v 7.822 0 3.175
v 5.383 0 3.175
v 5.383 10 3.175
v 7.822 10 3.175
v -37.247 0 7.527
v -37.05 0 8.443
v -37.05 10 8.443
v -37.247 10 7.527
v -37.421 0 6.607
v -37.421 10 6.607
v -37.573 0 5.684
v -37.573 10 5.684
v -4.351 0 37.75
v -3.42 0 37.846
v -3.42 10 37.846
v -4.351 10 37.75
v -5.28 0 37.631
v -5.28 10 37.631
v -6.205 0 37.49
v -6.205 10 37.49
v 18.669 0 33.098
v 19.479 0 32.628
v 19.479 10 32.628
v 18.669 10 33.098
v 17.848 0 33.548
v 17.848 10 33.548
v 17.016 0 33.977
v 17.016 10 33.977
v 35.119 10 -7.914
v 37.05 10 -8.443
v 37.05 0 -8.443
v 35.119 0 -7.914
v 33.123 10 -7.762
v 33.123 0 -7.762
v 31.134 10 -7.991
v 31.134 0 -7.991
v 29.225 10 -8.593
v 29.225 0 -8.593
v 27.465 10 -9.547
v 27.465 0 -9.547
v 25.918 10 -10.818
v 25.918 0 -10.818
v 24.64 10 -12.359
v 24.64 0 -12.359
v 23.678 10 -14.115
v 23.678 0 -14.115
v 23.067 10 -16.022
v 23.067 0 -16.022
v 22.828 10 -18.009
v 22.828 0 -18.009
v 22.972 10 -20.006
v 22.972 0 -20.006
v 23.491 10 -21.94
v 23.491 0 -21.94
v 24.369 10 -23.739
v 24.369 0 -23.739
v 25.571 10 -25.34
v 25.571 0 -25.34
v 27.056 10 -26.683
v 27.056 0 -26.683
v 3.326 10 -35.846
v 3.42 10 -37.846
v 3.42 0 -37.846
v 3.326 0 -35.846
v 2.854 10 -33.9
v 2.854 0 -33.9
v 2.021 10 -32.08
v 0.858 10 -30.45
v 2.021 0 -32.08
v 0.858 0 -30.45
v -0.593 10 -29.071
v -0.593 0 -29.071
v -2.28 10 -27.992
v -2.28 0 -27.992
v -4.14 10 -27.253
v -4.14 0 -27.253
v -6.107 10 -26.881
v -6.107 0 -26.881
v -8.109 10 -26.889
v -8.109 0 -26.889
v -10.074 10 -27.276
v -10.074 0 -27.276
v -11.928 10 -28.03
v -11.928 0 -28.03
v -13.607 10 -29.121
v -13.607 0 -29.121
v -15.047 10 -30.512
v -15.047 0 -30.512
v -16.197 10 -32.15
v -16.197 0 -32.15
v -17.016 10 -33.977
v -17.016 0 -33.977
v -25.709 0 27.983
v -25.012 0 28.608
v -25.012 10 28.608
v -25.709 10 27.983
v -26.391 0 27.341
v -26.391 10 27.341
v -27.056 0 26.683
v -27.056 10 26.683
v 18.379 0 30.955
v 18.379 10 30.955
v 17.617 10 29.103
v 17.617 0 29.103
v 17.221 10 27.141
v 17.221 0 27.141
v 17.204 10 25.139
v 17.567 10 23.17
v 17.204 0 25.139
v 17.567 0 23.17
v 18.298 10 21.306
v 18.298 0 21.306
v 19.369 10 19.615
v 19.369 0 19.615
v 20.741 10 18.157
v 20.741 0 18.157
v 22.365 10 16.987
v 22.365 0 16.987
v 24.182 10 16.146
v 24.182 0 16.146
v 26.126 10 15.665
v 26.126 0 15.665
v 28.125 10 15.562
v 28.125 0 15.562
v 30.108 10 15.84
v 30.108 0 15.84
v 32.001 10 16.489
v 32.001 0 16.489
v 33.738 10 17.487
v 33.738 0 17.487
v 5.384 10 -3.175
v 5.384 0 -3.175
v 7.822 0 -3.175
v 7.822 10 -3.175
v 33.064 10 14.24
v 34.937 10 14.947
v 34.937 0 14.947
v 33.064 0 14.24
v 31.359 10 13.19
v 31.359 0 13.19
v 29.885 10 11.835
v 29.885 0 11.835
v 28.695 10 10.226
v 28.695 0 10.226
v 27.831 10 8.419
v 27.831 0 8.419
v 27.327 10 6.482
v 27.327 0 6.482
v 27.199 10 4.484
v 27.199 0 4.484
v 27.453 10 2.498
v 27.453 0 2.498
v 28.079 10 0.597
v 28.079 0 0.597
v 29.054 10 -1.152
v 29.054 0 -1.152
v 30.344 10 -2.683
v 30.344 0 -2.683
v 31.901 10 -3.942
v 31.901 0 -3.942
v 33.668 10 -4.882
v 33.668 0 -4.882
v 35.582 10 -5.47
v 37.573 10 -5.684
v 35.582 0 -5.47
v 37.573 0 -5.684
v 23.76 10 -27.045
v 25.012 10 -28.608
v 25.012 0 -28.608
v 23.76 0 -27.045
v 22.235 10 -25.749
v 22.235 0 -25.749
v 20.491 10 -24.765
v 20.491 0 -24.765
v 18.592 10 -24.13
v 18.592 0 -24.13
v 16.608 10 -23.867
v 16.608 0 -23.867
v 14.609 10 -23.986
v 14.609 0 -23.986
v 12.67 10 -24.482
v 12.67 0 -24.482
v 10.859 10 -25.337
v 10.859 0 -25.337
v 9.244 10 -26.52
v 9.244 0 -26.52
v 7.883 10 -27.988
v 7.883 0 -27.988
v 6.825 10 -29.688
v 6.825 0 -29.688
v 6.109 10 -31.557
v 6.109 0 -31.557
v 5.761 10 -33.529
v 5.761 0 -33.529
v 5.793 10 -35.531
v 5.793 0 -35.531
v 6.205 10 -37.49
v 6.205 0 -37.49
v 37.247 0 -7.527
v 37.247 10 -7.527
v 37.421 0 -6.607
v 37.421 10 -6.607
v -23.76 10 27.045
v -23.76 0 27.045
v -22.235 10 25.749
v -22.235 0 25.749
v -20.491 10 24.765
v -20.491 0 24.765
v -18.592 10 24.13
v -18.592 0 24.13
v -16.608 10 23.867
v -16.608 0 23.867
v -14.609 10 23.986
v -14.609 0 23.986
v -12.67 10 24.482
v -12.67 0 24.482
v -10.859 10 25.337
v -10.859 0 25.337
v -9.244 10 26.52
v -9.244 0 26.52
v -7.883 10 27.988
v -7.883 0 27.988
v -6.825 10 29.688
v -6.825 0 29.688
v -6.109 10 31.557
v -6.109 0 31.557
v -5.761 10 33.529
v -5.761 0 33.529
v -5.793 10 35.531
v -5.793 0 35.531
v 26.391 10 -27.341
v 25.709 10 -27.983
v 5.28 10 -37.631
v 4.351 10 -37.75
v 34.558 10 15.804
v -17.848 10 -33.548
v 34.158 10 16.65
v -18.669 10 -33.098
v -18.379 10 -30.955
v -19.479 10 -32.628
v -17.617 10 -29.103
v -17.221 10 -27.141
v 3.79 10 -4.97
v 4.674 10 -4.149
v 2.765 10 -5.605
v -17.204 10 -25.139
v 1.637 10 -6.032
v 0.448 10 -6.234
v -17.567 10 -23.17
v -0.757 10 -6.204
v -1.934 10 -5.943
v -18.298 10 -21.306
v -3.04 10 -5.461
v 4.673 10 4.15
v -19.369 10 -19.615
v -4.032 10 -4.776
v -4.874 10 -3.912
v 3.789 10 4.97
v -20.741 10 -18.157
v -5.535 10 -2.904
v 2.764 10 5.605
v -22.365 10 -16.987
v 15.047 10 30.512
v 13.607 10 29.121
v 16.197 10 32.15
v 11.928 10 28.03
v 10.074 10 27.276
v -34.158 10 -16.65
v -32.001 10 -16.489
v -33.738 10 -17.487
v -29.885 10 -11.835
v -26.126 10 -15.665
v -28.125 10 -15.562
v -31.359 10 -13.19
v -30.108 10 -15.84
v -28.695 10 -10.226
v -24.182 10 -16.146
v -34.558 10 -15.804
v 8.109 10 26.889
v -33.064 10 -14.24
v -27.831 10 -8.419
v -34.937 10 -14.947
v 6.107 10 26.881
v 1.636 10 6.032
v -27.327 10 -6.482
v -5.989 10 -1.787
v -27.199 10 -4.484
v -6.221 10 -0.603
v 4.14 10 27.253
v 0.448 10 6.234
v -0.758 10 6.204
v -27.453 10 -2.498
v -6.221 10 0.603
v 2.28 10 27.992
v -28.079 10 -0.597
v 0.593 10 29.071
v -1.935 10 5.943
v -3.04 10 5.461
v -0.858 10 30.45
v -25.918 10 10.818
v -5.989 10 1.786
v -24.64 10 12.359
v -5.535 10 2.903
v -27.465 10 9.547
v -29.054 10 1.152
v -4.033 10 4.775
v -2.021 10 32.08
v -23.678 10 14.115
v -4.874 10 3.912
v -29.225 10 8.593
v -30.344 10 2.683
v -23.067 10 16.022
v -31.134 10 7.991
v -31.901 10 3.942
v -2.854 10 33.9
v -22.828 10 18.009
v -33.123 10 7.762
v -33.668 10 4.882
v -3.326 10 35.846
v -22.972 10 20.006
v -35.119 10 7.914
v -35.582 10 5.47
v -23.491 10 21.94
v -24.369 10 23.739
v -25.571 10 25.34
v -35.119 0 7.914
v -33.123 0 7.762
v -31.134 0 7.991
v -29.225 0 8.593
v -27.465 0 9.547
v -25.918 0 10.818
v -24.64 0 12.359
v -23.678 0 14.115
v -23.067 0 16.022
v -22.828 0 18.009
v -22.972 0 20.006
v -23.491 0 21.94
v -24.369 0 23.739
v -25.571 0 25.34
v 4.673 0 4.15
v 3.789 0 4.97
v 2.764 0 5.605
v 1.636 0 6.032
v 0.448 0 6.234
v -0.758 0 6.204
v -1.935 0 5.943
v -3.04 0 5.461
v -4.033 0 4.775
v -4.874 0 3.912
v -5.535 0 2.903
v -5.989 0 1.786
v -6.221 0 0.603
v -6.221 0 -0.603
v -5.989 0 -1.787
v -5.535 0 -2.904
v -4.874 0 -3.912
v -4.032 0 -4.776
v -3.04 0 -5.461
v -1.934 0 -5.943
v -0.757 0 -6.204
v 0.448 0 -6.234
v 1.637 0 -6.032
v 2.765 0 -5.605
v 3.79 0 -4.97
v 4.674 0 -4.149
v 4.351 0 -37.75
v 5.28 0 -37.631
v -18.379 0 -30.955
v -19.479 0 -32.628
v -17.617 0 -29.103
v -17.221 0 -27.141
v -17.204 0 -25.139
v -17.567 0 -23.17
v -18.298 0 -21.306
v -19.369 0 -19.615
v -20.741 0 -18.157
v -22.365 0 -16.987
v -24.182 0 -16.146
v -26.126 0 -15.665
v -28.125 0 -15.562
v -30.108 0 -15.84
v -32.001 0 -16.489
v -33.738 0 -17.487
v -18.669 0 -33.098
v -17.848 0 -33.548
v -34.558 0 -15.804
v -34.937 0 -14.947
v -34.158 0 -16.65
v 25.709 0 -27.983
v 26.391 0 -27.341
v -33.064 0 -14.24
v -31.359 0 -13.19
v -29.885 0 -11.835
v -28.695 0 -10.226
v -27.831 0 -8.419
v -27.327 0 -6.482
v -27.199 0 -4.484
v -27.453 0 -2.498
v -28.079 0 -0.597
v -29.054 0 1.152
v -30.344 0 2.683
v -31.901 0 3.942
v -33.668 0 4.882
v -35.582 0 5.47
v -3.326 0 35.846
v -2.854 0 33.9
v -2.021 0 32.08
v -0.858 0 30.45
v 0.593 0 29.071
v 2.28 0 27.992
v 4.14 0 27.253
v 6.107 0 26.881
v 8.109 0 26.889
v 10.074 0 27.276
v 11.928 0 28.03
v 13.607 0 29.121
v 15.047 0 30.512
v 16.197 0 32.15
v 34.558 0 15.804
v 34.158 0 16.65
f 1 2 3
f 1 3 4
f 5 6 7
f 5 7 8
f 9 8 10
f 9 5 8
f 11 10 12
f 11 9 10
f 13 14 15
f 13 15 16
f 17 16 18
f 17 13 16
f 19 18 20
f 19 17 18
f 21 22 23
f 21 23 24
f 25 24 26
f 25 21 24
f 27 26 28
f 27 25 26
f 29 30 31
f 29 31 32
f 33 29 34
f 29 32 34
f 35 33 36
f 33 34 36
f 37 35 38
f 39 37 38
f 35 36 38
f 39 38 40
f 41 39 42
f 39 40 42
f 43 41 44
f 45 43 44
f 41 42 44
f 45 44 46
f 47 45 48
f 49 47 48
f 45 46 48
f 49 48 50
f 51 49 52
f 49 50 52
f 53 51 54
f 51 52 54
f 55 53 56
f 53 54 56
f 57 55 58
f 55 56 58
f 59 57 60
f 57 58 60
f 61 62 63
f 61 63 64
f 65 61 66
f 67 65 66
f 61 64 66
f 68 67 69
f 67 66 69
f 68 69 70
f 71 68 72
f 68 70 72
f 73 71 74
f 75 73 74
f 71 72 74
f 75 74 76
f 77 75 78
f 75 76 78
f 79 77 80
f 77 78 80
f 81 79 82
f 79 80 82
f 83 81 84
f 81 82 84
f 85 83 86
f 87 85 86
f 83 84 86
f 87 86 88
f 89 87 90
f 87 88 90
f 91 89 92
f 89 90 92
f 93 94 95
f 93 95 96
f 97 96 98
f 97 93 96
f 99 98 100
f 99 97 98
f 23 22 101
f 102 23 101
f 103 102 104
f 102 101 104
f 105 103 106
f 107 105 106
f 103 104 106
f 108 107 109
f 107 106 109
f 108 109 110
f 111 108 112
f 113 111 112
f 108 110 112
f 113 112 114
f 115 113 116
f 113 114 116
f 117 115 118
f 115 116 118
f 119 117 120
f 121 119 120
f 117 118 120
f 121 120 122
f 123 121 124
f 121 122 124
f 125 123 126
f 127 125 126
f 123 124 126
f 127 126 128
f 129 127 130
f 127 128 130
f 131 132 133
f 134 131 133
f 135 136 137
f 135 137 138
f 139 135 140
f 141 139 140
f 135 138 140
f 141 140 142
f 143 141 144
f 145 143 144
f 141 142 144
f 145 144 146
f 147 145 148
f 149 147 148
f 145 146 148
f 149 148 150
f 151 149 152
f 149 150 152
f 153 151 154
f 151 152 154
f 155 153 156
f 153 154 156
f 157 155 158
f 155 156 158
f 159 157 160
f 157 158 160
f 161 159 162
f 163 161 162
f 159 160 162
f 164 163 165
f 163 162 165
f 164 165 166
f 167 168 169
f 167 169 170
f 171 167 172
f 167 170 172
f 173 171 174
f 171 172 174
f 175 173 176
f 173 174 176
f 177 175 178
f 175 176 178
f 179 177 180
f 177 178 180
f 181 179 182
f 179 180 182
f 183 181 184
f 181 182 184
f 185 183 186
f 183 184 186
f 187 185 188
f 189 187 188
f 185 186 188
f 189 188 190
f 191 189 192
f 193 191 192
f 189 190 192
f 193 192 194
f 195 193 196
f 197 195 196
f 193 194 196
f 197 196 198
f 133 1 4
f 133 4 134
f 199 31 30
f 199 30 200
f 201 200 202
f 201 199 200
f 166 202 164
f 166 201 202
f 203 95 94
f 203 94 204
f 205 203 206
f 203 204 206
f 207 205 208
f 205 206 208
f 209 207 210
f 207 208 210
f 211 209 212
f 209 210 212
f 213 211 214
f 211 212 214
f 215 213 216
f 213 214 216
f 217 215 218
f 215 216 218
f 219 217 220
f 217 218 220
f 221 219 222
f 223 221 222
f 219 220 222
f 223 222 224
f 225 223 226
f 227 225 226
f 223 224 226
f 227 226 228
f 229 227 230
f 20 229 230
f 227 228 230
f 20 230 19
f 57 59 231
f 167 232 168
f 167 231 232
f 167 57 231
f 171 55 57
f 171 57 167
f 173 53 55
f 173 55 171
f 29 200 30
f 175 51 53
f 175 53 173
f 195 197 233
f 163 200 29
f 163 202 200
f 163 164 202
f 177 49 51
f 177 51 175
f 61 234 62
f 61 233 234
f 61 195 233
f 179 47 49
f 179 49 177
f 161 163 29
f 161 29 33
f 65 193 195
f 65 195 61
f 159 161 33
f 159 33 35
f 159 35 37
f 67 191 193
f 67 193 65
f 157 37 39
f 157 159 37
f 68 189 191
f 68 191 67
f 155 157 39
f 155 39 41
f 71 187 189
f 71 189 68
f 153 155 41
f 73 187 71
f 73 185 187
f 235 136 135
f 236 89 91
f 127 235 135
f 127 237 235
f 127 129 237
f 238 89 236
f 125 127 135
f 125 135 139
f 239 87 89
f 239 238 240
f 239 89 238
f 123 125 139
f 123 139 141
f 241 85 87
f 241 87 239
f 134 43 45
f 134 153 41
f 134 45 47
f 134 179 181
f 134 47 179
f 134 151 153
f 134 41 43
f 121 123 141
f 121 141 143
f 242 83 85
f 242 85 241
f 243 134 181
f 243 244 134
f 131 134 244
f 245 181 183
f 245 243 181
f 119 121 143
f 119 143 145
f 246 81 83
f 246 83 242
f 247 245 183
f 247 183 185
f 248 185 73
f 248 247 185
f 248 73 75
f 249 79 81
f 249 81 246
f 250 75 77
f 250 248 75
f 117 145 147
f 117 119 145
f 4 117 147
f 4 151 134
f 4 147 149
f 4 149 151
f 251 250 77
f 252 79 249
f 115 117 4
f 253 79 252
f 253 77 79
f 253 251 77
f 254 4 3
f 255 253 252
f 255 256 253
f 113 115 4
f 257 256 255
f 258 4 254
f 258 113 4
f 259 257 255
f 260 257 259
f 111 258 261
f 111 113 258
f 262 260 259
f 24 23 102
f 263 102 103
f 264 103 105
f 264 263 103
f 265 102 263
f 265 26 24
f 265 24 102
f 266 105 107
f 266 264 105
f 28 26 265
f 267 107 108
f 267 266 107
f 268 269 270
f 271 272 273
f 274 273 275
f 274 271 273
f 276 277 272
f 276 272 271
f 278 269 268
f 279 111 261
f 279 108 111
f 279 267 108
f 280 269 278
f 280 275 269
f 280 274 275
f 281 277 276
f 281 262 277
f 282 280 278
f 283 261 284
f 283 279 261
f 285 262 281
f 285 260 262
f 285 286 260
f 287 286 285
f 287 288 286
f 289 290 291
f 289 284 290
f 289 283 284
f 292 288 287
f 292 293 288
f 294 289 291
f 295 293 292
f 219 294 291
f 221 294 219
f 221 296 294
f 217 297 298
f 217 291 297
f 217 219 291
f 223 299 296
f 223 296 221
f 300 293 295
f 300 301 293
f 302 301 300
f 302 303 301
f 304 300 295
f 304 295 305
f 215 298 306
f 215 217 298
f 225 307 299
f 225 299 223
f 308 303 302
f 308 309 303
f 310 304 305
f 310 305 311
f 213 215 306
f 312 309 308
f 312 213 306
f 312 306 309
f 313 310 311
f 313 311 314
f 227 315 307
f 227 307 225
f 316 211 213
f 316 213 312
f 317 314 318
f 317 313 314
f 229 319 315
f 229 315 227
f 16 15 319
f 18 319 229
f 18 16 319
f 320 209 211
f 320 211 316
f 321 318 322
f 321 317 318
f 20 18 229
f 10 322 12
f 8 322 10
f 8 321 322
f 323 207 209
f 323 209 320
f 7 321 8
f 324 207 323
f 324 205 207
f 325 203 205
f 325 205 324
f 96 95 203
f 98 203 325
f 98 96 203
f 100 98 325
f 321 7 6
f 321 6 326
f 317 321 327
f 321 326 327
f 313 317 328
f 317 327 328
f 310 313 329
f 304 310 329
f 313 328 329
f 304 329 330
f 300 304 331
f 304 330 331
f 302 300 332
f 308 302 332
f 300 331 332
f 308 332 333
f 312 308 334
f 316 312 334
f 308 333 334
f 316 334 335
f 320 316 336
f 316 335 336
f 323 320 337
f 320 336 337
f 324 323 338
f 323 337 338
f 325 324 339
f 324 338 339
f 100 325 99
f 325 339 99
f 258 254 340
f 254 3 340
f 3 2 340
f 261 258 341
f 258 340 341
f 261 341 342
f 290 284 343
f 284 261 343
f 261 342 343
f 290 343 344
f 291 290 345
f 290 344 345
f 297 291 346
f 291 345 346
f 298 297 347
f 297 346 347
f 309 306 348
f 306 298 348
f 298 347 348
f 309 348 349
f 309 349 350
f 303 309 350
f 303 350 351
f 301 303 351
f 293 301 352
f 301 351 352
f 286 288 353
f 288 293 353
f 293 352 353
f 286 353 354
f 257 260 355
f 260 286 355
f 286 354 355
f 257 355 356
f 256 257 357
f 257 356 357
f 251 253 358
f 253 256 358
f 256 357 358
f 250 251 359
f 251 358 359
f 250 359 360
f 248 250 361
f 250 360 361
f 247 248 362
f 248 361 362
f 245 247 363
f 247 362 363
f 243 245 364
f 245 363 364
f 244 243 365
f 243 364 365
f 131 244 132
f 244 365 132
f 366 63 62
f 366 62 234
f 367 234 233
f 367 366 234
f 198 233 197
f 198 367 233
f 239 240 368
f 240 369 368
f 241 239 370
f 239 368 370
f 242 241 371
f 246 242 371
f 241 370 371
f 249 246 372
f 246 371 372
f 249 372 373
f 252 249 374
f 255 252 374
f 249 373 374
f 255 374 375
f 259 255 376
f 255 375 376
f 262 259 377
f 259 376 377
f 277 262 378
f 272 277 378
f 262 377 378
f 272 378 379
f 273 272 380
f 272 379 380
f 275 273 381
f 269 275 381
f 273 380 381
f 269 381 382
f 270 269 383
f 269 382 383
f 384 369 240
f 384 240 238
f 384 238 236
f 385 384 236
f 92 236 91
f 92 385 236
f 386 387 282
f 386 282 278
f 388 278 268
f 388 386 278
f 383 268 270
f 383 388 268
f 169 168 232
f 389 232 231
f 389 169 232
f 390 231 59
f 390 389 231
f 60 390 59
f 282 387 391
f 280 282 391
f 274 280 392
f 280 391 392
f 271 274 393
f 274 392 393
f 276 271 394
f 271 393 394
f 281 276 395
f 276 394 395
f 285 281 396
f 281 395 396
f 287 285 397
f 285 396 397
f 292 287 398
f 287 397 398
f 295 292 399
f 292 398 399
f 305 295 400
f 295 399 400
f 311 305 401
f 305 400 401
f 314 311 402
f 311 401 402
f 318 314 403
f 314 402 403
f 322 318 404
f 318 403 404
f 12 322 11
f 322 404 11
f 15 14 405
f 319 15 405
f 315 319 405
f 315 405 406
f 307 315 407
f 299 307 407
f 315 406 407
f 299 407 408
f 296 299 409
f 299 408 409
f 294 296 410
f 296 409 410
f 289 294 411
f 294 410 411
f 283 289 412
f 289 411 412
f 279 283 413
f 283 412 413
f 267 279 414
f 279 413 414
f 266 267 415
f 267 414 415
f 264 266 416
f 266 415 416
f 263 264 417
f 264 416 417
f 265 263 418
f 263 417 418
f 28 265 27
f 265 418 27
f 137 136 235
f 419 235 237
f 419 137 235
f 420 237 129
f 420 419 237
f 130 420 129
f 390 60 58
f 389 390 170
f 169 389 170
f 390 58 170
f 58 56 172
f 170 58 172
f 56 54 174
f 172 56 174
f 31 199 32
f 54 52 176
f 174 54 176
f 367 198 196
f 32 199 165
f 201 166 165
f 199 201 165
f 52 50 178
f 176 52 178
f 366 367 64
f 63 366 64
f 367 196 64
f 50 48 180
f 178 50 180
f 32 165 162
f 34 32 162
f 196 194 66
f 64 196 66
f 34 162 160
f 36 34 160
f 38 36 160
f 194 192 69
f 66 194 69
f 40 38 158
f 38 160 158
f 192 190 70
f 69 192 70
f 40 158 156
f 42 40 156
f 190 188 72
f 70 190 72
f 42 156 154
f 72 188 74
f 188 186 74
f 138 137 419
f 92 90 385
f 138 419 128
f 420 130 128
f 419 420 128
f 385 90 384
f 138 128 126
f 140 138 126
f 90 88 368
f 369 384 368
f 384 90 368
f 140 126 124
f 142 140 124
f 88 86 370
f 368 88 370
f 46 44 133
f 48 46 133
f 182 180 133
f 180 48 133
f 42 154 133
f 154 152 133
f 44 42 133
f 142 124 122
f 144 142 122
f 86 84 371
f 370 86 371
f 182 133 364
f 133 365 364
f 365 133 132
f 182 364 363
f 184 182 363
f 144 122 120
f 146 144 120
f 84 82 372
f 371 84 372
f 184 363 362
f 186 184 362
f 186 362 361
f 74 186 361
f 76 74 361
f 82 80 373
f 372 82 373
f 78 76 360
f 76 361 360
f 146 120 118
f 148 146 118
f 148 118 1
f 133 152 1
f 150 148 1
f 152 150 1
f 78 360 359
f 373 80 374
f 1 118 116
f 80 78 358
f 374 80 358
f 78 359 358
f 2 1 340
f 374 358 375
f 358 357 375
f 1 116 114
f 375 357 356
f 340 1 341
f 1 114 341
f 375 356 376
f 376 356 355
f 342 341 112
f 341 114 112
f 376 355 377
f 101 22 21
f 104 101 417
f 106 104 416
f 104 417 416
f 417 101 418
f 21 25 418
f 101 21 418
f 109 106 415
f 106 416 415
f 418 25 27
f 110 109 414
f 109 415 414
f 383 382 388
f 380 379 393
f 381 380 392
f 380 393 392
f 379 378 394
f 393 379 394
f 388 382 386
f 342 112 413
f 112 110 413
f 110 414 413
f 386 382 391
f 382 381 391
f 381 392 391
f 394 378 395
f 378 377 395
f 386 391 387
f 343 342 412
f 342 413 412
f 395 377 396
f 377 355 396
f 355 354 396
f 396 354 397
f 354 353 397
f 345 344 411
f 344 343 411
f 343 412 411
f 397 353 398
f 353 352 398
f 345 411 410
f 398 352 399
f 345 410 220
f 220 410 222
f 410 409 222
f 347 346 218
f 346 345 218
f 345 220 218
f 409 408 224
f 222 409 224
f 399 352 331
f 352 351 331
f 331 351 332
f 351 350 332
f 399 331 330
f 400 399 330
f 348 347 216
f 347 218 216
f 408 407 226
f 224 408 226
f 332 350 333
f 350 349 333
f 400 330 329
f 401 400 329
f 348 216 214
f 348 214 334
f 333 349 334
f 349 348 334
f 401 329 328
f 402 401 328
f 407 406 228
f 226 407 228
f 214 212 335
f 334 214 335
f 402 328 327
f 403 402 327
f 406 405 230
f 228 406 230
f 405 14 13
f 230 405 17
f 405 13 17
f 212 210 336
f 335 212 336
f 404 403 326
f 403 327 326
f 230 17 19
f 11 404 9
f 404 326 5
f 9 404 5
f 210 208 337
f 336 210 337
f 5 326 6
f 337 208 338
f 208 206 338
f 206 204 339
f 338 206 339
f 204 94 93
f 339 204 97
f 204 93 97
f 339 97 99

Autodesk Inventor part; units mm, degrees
ref_plane "YZ Plane" through (0, 0, 0) normal (1, 0, 0) x (0, 1, 0)
ref_plane "XZ Plane" through (0, 0, 0) normal (0, 1, 0) x (-1, 0, 0)
ref_plane "XY Plane" through (0, 0, 0) normal (0, 0, 1) x (1, 0, 0)
sketch "Sketch1" plane through (0, 0, 0) normal (0, 1, 0) x (-1, 0, 0)
  arc A0 (-5.3837, -3.1747) -> (-5.3833, 3.1753) centre (0, 0) ccw
  line L0 (-5.3833, 3.1753) -> (-7.8217, 3.1753)
  line L1 (-5.3837, -3.1747) -> (-7.8217, -3.1747)
  line L2 (-7.8217, 3.1753) -> (-7.8217, -3.1747)
  circle A1 centre (0, 0) radius 27.5 construction
  circle A2 centre (0, 0) radius 38
  arc A3 (37.5726, 5.6835) -> (34.9367, -14.9474) centre (37.6936, -4.8158) ccw
  arc A4 (27.0562, 26.6827) -> (37.0503, 8.4426) centre (33.3254, 18.2597) ccw
  arc A5 (6.2052, 37.4899) -> (25.0119, 28.6078) centre (16.228, 34.3606) ccw
  arc A6 (-17.0159, 33.9773) -> (3.4198, 37.8458) centre (-7.0679, 37.3369) ccw
  arc A7 (-33.7375, 17.4865) -> (-19.4786, 32.628) centre (-27.6641, 26.0518) ccw
  arc A8 (-37.5726, -5.6835) -> (-34.9367, 14.9474) centre (-37.6936, 4.8158) ccw
  arc A9 (-27.0562, -26.6827) -> (-37.0503, -8.4426) centre (-33.3254, -18.2597) ccw
  arc A10 (-6.2052, -37.4899) -> (-25.0119, -28.6078) centre (-16.228, -34.3606) ccw
  arc A11 (17.0159, -33.9773) -> (-3.4198, -37.8458) centre (7.0679, -37.3369) ccw
  arc A12 (33.7375, -17.4865) -> (19.4786, -32.628) centre (27.6641, -26.0518) ccw
  dimension "d0" = 12.5
  dimension "d1" = 6.35
  dimension "d2" = 2.4384
  dimension "d3" = 2.438
  dimension "d4" = 55
  dimension "d5" = 76
  dimension "d6" = 10.5
  dimension "d9" = 360
extrude "Extrusion1" add sketch "Sketch1" along normal blind 10 contours A3 A2 A12 A11 A10 A9 A8 A7 A6 A5 A4 | A4 A2 | A2 A12 | A5 A2 | A2 A11 | A6 A2 | A2 A10 | A7 A2 | A2 A9 | A8 A2
sketch "Sketch2" plane through (0, 10, 0) normal (0, 1, 0) x (1, 0, 0)
  arc A0 (-37.5726, -5.6835) -> (-34.9367, 14.9474) centre (-37.6936, 4.8158) ccw projected
  arc A1 (-37.5726, -5.6835) -> (-34.9367, 14.9474) centre (-37.6936, 4.8158) ccw projected
  circle A2 centre (0, 0) radius 38 projected
  arc A3 (-27.0562, -26.6827) -> (-37.0503, -8.4426) centre (-33.3254, -18.2597) ccw projected
hole "Hole1" at (-33.3254, 10, 18.2597) direction (0, -1, 0) diameter 21 end through all
pattern_circular "Circular Pattern1" count 10 over 360 about axis through (0, 10, 0) along (0, -1, 0) of "Hole1"
properties part number "gear"
